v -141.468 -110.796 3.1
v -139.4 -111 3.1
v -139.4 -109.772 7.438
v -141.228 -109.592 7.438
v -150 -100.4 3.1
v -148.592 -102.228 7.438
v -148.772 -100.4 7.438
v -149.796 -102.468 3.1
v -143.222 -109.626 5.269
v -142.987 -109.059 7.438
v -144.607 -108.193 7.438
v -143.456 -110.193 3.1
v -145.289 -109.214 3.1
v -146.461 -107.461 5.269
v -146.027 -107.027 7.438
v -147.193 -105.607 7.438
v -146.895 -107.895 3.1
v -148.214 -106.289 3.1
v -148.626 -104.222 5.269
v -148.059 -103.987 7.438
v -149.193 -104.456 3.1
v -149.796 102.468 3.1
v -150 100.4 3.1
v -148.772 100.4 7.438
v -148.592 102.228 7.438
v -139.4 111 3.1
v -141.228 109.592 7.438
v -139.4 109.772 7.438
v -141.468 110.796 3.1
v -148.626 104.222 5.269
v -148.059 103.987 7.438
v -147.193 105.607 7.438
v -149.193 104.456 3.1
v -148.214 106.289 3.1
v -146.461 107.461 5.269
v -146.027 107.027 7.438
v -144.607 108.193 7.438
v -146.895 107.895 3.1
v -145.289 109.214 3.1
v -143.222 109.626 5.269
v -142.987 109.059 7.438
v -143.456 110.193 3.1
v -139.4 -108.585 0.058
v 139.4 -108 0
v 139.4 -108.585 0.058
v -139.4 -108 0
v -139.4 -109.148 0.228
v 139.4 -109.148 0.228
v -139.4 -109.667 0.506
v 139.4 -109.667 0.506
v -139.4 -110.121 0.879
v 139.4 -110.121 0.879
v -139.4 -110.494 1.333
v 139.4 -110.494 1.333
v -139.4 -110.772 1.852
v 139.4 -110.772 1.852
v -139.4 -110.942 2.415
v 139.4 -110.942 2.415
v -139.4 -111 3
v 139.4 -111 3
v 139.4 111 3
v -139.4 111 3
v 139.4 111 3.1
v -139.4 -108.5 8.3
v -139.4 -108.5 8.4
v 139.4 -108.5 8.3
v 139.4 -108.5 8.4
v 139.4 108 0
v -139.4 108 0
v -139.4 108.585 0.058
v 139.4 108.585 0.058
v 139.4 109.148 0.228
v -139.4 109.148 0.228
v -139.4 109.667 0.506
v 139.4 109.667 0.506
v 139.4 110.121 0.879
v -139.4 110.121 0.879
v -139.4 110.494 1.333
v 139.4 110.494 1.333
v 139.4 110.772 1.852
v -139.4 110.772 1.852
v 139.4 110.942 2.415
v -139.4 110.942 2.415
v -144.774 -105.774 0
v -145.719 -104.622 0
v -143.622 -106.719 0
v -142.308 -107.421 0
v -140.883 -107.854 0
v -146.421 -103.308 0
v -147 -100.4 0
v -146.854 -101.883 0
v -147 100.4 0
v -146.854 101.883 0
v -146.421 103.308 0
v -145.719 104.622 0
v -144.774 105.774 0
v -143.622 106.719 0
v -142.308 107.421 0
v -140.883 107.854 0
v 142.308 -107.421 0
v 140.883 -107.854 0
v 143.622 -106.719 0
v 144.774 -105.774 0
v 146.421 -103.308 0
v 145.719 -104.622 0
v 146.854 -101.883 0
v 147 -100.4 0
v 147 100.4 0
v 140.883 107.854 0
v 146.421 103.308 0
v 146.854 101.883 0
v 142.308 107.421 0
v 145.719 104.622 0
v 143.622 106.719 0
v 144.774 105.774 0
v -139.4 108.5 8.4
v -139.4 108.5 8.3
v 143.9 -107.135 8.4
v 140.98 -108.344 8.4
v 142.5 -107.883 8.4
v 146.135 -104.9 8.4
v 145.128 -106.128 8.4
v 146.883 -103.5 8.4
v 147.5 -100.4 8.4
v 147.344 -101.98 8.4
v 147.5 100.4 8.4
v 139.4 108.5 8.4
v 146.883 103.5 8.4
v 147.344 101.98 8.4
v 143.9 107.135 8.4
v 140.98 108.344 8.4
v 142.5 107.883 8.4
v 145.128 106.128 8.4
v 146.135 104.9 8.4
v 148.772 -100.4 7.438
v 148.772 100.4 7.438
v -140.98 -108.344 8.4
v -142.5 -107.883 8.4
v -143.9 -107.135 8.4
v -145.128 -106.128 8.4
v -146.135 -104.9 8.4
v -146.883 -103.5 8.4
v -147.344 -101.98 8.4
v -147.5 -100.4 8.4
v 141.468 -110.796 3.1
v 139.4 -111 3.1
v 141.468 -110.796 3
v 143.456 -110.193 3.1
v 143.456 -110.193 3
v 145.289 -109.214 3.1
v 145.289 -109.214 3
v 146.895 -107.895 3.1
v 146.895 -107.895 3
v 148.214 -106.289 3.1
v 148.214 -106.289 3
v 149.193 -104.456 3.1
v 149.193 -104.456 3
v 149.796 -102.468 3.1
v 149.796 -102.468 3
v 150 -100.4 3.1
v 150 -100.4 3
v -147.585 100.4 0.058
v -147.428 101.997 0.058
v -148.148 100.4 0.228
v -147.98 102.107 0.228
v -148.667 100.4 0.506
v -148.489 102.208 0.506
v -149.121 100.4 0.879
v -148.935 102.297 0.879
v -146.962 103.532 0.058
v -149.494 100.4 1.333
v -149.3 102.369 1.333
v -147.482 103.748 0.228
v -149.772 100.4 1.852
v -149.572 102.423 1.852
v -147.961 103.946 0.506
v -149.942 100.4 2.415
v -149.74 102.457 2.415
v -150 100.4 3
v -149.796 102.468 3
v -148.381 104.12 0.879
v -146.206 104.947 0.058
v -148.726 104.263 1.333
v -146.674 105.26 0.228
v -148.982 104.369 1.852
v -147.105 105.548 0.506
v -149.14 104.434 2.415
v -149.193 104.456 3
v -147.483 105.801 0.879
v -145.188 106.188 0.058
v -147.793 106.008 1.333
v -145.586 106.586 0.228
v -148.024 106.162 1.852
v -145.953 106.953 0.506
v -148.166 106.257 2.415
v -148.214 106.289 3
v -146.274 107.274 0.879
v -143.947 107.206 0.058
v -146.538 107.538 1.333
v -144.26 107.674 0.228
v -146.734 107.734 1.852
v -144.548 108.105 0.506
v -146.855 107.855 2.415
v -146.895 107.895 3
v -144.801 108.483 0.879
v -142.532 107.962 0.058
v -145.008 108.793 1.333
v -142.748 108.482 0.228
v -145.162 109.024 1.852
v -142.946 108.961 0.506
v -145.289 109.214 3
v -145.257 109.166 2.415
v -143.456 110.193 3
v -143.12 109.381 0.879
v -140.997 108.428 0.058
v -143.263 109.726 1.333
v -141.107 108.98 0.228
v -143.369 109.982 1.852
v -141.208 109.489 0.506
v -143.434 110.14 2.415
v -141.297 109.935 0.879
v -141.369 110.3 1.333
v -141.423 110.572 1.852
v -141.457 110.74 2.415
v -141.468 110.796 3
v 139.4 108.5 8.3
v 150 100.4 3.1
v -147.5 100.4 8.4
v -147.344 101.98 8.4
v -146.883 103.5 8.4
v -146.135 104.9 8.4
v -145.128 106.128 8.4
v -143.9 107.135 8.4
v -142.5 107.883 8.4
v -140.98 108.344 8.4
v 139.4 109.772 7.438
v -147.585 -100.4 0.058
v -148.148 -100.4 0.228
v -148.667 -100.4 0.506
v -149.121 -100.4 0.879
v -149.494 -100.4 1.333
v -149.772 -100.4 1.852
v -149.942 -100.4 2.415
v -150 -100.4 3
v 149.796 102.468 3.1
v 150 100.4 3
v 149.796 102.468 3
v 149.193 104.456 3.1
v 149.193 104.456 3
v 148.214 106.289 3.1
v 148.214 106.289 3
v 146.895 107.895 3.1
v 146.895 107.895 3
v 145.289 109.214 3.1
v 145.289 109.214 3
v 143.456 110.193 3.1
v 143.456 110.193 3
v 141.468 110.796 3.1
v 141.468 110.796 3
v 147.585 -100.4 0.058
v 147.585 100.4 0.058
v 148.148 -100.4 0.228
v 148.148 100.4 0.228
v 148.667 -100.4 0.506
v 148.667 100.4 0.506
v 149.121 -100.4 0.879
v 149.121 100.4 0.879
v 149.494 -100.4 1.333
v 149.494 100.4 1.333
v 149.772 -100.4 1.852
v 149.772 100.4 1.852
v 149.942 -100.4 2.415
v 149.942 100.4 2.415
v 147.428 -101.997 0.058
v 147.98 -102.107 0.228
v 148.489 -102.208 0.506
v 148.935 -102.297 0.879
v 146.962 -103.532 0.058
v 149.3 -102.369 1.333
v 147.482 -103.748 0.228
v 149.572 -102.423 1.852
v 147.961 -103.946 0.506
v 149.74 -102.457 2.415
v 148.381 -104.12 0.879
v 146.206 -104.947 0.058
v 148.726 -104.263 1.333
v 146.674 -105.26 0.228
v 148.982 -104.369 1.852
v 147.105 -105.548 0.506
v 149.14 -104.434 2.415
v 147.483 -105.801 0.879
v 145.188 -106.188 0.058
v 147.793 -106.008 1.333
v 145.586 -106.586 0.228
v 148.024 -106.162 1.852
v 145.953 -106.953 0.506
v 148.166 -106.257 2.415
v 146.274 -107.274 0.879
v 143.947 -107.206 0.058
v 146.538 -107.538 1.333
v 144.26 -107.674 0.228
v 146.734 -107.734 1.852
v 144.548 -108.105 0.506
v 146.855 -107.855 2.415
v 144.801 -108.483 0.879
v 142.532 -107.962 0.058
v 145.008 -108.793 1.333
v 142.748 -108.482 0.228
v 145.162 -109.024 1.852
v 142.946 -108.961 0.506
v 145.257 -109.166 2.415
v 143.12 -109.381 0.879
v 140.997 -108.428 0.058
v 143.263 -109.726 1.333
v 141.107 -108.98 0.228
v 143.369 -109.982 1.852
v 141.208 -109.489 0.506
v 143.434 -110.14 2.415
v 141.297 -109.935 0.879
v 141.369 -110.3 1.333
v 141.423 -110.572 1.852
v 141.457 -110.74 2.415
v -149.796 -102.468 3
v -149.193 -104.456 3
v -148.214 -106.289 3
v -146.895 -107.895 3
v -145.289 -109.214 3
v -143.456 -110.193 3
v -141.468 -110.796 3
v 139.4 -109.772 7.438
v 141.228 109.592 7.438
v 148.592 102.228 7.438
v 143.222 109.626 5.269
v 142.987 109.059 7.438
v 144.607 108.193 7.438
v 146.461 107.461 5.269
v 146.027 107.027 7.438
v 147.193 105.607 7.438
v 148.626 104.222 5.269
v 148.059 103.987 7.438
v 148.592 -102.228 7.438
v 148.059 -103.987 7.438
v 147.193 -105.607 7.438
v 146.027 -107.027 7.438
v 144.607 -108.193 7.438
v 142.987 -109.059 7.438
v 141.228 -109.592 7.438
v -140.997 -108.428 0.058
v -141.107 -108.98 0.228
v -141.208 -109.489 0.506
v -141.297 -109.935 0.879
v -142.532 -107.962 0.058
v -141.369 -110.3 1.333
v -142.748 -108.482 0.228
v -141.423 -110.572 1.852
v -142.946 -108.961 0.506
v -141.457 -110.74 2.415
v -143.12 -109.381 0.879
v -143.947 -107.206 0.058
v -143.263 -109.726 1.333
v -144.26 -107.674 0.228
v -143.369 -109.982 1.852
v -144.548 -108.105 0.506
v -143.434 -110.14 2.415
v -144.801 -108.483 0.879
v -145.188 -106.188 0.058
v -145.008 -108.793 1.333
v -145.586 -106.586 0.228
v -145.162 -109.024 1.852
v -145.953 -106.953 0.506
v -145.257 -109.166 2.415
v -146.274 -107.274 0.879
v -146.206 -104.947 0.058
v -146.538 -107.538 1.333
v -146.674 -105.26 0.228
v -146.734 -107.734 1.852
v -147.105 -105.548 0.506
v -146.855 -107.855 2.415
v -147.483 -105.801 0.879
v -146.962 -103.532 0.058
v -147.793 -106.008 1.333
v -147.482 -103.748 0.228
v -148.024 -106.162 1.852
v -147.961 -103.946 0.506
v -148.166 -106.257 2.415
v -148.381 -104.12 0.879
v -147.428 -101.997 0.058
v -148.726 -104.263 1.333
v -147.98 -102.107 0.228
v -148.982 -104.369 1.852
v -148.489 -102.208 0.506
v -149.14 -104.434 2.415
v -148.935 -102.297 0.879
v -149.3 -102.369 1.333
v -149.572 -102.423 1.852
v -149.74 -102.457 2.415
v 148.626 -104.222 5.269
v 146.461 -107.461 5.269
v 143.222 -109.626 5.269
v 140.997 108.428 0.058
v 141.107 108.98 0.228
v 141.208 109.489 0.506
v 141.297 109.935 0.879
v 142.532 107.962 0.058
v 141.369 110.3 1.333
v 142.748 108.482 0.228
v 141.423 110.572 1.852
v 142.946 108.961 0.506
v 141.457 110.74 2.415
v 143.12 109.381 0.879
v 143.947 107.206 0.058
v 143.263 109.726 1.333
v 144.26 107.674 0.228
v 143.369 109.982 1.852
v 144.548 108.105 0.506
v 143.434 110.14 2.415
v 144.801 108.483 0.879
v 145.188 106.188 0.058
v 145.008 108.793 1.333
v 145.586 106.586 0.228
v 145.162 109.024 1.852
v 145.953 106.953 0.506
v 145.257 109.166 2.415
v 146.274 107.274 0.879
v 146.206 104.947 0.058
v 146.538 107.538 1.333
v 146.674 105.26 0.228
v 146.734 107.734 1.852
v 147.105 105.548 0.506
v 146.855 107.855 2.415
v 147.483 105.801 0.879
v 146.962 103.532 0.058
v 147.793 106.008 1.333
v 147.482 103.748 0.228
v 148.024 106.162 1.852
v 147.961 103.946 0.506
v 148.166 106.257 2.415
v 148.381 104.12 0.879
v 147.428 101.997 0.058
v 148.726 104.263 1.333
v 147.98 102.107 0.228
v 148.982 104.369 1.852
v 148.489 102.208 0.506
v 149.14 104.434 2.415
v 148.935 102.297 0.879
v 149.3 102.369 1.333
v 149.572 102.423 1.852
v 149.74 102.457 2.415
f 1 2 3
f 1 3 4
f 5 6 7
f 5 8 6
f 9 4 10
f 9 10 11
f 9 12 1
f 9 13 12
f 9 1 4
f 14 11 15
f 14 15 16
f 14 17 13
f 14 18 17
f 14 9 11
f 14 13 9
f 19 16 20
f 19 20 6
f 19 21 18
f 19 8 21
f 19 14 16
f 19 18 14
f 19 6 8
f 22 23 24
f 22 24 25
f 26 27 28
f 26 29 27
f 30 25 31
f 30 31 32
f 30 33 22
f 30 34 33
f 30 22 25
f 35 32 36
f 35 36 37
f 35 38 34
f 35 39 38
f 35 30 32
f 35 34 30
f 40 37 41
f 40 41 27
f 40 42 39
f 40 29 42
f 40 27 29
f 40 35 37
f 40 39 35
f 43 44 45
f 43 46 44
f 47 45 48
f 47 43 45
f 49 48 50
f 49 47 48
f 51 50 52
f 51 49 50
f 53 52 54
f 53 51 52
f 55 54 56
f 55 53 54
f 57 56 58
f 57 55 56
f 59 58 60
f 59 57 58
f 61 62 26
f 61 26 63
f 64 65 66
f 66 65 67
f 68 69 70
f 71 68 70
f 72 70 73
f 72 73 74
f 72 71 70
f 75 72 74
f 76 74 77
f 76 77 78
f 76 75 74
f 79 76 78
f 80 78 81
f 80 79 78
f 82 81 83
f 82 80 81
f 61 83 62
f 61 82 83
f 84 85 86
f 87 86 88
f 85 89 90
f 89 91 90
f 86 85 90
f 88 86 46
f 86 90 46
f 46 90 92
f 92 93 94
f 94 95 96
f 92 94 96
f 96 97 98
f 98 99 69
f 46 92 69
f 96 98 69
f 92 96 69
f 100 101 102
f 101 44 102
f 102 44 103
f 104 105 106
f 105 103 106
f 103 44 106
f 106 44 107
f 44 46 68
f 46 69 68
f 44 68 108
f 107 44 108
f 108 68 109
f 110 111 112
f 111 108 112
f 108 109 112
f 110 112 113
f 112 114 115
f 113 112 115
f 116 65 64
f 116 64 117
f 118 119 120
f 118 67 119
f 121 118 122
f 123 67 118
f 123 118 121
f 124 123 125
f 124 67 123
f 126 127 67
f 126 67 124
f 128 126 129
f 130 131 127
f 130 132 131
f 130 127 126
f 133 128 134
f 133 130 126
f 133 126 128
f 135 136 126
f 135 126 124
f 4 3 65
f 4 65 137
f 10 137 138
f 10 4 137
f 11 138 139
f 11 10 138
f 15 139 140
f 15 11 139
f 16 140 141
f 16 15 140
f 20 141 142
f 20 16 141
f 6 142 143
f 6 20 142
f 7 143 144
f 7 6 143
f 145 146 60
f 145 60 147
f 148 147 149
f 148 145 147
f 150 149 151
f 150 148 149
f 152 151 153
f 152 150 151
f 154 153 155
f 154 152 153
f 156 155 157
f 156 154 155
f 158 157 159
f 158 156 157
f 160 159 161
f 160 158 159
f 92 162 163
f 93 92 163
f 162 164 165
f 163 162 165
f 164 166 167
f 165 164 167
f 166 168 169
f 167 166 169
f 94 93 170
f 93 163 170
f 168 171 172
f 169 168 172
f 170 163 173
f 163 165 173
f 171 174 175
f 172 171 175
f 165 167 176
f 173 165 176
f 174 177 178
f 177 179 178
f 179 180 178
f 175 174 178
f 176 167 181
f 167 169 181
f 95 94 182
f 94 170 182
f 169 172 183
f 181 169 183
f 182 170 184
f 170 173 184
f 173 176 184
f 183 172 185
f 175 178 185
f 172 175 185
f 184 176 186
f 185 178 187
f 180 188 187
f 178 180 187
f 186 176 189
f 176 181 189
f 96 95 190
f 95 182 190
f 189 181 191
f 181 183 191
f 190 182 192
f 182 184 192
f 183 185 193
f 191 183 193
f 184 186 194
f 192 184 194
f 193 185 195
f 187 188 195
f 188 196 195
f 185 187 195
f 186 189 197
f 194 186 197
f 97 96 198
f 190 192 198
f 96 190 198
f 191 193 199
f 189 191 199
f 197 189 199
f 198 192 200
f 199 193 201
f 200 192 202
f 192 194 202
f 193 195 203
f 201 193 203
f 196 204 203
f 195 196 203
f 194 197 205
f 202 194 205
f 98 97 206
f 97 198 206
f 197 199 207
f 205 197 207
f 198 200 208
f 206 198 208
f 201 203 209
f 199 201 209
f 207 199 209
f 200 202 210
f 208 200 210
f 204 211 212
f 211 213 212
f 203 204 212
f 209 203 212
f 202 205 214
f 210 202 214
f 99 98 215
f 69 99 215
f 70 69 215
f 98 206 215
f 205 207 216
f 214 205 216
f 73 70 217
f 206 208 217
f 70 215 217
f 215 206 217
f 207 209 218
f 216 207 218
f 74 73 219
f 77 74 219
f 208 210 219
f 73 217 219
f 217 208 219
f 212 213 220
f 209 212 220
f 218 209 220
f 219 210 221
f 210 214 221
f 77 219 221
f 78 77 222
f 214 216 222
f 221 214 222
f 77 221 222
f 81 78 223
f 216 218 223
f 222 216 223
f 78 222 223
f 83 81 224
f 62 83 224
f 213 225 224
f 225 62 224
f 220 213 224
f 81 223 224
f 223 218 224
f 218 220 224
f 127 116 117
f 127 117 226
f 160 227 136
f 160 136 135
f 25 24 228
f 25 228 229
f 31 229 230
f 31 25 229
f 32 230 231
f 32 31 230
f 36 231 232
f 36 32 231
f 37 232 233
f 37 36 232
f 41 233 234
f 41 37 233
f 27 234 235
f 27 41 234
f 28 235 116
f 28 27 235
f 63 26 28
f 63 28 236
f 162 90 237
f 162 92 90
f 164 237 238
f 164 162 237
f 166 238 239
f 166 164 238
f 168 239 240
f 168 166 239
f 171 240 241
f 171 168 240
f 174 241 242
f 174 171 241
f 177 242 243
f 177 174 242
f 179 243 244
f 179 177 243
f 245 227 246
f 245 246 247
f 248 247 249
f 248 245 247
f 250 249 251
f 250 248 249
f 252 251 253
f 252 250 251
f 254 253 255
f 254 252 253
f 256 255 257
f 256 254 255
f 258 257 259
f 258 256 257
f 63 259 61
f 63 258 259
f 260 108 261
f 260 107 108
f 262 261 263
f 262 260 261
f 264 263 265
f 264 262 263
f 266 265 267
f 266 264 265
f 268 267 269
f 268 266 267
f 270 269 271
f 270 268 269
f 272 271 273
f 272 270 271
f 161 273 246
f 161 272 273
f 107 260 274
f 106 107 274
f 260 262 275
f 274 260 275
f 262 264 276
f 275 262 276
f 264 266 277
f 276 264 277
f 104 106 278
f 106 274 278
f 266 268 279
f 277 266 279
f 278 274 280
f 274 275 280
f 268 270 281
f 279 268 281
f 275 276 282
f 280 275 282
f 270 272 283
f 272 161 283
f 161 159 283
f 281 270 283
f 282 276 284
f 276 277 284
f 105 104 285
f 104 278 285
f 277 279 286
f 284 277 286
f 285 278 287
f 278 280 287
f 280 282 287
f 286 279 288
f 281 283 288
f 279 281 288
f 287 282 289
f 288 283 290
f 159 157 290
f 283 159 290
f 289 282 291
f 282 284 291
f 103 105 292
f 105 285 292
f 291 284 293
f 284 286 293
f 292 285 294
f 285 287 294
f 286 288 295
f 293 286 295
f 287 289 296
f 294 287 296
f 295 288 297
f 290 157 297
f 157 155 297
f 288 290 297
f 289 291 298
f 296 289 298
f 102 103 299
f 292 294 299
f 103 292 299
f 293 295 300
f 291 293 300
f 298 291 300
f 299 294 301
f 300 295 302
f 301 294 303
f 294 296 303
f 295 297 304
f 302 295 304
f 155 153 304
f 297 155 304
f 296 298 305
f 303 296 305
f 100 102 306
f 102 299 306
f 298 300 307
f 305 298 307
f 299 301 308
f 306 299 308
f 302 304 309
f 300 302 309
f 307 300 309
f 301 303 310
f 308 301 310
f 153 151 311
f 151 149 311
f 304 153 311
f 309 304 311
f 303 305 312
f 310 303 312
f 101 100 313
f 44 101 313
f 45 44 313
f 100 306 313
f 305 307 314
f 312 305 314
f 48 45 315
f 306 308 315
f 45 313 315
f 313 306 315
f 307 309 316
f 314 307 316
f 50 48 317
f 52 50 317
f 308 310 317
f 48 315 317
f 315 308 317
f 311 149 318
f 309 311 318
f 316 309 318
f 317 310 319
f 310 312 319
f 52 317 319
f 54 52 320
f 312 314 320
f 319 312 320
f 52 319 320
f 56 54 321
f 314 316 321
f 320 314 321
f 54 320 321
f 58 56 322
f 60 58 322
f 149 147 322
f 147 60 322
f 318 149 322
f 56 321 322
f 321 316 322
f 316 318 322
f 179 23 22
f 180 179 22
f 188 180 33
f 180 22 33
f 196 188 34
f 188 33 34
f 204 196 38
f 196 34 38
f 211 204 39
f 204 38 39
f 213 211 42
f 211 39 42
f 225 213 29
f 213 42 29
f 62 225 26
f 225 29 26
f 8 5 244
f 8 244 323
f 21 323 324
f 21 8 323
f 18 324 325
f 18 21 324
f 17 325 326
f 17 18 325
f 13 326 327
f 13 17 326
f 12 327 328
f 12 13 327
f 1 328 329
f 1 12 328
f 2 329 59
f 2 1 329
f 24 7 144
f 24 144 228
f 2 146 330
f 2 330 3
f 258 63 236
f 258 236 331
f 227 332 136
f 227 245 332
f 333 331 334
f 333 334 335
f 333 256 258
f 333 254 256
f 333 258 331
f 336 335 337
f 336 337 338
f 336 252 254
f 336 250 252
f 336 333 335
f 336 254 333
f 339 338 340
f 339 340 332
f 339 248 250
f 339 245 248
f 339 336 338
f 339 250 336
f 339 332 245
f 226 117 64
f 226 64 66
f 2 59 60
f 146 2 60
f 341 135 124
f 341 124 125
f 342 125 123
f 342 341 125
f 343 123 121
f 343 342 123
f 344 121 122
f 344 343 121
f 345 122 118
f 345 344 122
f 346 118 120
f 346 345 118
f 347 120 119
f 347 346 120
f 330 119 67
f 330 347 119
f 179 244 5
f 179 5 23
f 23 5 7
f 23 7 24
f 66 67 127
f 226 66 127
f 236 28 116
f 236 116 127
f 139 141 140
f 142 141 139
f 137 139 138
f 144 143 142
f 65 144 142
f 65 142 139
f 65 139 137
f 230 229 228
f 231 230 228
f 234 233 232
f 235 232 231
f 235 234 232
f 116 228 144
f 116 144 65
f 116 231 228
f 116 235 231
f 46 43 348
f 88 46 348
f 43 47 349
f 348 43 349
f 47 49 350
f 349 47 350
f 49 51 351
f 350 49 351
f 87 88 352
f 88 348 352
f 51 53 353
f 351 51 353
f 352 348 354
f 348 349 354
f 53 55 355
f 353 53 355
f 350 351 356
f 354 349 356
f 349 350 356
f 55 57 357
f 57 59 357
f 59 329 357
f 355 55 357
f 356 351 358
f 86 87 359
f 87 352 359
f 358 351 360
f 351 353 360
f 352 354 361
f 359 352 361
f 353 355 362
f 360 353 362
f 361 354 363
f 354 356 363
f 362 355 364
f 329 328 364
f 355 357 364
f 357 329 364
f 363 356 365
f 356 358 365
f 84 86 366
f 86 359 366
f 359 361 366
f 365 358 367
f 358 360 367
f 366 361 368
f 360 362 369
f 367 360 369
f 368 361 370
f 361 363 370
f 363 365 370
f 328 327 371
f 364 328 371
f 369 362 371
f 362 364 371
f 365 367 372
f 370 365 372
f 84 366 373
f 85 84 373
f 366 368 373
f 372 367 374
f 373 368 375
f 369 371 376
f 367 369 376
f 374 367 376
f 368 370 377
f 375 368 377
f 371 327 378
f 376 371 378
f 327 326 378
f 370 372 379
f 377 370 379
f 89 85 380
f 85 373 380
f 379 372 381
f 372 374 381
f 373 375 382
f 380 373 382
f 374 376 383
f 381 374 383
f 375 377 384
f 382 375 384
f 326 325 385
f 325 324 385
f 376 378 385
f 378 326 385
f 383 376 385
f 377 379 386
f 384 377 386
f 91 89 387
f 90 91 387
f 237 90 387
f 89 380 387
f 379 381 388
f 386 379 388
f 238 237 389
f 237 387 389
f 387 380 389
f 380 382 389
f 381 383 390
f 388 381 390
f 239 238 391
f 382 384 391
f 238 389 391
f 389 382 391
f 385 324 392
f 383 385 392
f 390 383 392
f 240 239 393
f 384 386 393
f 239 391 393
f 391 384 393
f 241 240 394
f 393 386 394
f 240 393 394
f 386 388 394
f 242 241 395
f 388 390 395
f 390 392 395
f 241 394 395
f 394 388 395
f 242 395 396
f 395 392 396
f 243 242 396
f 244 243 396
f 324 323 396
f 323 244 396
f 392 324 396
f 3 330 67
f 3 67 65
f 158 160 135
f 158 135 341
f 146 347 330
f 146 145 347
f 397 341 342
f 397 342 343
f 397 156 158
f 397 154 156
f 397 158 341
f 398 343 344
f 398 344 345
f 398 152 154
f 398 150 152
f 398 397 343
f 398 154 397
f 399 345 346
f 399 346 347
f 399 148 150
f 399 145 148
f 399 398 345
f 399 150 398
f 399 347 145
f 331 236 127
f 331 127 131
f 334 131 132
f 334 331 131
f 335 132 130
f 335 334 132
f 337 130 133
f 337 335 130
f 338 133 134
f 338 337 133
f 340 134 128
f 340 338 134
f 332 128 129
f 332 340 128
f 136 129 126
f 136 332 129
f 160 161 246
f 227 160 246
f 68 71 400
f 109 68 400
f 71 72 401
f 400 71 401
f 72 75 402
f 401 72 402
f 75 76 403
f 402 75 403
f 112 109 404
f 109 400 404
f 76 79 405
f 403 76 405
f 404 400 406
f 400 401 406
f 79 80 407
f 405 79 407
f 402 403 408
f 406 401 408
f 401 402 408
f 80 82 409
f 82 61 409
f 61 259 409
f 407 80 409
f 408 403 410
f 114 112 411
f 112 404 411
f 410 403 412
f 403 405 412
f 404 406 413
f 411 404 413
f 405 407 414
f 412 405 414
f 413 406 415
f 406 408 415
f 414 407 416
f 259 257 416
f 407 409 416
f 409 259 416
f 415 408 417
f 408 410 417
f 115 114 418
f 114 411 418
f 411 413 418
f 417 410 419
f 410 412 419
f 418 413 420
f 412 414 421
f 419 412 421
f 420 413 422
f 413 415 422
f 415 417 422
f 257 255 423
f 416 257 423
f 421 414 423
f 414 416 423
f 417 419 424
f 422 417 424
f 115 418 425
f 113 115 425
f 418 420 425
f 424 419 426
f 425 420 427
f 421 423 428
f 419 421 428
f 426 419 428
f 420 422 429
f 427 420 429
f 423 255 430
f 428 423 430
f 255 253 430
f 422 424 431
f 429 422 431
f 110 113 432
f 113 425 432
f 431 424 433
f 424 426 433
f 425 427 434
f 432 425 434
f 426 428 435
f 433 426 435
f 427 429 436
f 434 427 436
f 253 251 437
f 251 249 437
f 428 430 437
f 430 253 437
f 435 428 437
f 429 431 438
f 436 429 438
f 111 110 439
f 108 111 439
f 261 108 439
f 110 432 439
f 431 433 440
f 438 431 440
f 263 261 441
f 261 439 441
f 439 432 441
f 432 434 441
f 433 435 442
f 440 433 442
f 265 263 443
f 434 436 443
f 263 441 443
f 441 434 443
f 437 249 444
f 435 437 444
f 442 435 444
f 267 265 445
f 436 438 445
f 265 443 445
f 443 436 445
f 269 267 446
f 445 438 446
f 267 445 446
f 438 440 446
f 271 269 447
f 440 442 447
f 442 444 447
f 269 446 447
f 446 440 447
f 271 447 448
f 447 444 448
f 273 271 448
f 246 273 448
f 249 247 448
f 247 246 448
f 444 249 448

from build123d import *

# Parameters (mm, degrees)
F0_W     = 300
F0_H     = 222
F1_DEPTH = 8.4
F2_R     = 10.6
F3_R     = 3
F4_SIZE2 = 5.3
F4_SIZE  = 1.5
F5_SIZE  = 1
F6_W     = 278.8
F6_H     = 217
F7_DEPTH = 0.1


with BuildPart() as f1:
    # F0 (on Top) → F1 (new body)
    with BuildSketch(Plane.XY):
        Rectangle(F0_W, F0_H)
    extrude(amount=F1_DEPTH)

    # F2
    f2_edges = [f1.edges().sort_by_distance(p)[0] for p in [
        (-150, 111, 4.2),
        (-150, -111, 4.2),
        (150, -111, 4.2),
        (150, 111, 4.2),
    ]]
    fillet(f2_edges, radius=F2_R)

    # F3
    f3_edges = [f1.edges().sort_by_distance(p)[0] for p in [
        (0, 111, 0),
        (146.895332, 107.895332, 0),
        (150, 0, 0),
    ]]
    fillet(f3_edges, radius=F3_R)

    # F4
    f4_edges = [f1.edges().sort_by_distance(p)[0] for p in [
        (-150, 0, 8.4),
        (-146.895332, 107.895332, 8.4),
        (0, 111, 8.4),
    ]]
    f4_side = f1.faces().sort_by_distance((0, 0, 8.4))[0]
    chamfer(f4_edges, length=F4_SIZE, length2=F4_SIZE2, reference=f4_side)

    # F5
    f5_edges = [f1.edges().sort_by_distance(p)[0] for p in [
        (0, 109.5, 8.4),
    ]]
    chamfer(f5_edges, length=F5_SIZE)

    # F6 (on face) → F7 (cut)
    with BuildSketch(Plane.XY.offset(8.4)):
        Rectangle(F6_W, F6_H)
    extrude(amount=-F7_DEPTH, mode=Mode.SUBTRACT)


solid = f1.part
